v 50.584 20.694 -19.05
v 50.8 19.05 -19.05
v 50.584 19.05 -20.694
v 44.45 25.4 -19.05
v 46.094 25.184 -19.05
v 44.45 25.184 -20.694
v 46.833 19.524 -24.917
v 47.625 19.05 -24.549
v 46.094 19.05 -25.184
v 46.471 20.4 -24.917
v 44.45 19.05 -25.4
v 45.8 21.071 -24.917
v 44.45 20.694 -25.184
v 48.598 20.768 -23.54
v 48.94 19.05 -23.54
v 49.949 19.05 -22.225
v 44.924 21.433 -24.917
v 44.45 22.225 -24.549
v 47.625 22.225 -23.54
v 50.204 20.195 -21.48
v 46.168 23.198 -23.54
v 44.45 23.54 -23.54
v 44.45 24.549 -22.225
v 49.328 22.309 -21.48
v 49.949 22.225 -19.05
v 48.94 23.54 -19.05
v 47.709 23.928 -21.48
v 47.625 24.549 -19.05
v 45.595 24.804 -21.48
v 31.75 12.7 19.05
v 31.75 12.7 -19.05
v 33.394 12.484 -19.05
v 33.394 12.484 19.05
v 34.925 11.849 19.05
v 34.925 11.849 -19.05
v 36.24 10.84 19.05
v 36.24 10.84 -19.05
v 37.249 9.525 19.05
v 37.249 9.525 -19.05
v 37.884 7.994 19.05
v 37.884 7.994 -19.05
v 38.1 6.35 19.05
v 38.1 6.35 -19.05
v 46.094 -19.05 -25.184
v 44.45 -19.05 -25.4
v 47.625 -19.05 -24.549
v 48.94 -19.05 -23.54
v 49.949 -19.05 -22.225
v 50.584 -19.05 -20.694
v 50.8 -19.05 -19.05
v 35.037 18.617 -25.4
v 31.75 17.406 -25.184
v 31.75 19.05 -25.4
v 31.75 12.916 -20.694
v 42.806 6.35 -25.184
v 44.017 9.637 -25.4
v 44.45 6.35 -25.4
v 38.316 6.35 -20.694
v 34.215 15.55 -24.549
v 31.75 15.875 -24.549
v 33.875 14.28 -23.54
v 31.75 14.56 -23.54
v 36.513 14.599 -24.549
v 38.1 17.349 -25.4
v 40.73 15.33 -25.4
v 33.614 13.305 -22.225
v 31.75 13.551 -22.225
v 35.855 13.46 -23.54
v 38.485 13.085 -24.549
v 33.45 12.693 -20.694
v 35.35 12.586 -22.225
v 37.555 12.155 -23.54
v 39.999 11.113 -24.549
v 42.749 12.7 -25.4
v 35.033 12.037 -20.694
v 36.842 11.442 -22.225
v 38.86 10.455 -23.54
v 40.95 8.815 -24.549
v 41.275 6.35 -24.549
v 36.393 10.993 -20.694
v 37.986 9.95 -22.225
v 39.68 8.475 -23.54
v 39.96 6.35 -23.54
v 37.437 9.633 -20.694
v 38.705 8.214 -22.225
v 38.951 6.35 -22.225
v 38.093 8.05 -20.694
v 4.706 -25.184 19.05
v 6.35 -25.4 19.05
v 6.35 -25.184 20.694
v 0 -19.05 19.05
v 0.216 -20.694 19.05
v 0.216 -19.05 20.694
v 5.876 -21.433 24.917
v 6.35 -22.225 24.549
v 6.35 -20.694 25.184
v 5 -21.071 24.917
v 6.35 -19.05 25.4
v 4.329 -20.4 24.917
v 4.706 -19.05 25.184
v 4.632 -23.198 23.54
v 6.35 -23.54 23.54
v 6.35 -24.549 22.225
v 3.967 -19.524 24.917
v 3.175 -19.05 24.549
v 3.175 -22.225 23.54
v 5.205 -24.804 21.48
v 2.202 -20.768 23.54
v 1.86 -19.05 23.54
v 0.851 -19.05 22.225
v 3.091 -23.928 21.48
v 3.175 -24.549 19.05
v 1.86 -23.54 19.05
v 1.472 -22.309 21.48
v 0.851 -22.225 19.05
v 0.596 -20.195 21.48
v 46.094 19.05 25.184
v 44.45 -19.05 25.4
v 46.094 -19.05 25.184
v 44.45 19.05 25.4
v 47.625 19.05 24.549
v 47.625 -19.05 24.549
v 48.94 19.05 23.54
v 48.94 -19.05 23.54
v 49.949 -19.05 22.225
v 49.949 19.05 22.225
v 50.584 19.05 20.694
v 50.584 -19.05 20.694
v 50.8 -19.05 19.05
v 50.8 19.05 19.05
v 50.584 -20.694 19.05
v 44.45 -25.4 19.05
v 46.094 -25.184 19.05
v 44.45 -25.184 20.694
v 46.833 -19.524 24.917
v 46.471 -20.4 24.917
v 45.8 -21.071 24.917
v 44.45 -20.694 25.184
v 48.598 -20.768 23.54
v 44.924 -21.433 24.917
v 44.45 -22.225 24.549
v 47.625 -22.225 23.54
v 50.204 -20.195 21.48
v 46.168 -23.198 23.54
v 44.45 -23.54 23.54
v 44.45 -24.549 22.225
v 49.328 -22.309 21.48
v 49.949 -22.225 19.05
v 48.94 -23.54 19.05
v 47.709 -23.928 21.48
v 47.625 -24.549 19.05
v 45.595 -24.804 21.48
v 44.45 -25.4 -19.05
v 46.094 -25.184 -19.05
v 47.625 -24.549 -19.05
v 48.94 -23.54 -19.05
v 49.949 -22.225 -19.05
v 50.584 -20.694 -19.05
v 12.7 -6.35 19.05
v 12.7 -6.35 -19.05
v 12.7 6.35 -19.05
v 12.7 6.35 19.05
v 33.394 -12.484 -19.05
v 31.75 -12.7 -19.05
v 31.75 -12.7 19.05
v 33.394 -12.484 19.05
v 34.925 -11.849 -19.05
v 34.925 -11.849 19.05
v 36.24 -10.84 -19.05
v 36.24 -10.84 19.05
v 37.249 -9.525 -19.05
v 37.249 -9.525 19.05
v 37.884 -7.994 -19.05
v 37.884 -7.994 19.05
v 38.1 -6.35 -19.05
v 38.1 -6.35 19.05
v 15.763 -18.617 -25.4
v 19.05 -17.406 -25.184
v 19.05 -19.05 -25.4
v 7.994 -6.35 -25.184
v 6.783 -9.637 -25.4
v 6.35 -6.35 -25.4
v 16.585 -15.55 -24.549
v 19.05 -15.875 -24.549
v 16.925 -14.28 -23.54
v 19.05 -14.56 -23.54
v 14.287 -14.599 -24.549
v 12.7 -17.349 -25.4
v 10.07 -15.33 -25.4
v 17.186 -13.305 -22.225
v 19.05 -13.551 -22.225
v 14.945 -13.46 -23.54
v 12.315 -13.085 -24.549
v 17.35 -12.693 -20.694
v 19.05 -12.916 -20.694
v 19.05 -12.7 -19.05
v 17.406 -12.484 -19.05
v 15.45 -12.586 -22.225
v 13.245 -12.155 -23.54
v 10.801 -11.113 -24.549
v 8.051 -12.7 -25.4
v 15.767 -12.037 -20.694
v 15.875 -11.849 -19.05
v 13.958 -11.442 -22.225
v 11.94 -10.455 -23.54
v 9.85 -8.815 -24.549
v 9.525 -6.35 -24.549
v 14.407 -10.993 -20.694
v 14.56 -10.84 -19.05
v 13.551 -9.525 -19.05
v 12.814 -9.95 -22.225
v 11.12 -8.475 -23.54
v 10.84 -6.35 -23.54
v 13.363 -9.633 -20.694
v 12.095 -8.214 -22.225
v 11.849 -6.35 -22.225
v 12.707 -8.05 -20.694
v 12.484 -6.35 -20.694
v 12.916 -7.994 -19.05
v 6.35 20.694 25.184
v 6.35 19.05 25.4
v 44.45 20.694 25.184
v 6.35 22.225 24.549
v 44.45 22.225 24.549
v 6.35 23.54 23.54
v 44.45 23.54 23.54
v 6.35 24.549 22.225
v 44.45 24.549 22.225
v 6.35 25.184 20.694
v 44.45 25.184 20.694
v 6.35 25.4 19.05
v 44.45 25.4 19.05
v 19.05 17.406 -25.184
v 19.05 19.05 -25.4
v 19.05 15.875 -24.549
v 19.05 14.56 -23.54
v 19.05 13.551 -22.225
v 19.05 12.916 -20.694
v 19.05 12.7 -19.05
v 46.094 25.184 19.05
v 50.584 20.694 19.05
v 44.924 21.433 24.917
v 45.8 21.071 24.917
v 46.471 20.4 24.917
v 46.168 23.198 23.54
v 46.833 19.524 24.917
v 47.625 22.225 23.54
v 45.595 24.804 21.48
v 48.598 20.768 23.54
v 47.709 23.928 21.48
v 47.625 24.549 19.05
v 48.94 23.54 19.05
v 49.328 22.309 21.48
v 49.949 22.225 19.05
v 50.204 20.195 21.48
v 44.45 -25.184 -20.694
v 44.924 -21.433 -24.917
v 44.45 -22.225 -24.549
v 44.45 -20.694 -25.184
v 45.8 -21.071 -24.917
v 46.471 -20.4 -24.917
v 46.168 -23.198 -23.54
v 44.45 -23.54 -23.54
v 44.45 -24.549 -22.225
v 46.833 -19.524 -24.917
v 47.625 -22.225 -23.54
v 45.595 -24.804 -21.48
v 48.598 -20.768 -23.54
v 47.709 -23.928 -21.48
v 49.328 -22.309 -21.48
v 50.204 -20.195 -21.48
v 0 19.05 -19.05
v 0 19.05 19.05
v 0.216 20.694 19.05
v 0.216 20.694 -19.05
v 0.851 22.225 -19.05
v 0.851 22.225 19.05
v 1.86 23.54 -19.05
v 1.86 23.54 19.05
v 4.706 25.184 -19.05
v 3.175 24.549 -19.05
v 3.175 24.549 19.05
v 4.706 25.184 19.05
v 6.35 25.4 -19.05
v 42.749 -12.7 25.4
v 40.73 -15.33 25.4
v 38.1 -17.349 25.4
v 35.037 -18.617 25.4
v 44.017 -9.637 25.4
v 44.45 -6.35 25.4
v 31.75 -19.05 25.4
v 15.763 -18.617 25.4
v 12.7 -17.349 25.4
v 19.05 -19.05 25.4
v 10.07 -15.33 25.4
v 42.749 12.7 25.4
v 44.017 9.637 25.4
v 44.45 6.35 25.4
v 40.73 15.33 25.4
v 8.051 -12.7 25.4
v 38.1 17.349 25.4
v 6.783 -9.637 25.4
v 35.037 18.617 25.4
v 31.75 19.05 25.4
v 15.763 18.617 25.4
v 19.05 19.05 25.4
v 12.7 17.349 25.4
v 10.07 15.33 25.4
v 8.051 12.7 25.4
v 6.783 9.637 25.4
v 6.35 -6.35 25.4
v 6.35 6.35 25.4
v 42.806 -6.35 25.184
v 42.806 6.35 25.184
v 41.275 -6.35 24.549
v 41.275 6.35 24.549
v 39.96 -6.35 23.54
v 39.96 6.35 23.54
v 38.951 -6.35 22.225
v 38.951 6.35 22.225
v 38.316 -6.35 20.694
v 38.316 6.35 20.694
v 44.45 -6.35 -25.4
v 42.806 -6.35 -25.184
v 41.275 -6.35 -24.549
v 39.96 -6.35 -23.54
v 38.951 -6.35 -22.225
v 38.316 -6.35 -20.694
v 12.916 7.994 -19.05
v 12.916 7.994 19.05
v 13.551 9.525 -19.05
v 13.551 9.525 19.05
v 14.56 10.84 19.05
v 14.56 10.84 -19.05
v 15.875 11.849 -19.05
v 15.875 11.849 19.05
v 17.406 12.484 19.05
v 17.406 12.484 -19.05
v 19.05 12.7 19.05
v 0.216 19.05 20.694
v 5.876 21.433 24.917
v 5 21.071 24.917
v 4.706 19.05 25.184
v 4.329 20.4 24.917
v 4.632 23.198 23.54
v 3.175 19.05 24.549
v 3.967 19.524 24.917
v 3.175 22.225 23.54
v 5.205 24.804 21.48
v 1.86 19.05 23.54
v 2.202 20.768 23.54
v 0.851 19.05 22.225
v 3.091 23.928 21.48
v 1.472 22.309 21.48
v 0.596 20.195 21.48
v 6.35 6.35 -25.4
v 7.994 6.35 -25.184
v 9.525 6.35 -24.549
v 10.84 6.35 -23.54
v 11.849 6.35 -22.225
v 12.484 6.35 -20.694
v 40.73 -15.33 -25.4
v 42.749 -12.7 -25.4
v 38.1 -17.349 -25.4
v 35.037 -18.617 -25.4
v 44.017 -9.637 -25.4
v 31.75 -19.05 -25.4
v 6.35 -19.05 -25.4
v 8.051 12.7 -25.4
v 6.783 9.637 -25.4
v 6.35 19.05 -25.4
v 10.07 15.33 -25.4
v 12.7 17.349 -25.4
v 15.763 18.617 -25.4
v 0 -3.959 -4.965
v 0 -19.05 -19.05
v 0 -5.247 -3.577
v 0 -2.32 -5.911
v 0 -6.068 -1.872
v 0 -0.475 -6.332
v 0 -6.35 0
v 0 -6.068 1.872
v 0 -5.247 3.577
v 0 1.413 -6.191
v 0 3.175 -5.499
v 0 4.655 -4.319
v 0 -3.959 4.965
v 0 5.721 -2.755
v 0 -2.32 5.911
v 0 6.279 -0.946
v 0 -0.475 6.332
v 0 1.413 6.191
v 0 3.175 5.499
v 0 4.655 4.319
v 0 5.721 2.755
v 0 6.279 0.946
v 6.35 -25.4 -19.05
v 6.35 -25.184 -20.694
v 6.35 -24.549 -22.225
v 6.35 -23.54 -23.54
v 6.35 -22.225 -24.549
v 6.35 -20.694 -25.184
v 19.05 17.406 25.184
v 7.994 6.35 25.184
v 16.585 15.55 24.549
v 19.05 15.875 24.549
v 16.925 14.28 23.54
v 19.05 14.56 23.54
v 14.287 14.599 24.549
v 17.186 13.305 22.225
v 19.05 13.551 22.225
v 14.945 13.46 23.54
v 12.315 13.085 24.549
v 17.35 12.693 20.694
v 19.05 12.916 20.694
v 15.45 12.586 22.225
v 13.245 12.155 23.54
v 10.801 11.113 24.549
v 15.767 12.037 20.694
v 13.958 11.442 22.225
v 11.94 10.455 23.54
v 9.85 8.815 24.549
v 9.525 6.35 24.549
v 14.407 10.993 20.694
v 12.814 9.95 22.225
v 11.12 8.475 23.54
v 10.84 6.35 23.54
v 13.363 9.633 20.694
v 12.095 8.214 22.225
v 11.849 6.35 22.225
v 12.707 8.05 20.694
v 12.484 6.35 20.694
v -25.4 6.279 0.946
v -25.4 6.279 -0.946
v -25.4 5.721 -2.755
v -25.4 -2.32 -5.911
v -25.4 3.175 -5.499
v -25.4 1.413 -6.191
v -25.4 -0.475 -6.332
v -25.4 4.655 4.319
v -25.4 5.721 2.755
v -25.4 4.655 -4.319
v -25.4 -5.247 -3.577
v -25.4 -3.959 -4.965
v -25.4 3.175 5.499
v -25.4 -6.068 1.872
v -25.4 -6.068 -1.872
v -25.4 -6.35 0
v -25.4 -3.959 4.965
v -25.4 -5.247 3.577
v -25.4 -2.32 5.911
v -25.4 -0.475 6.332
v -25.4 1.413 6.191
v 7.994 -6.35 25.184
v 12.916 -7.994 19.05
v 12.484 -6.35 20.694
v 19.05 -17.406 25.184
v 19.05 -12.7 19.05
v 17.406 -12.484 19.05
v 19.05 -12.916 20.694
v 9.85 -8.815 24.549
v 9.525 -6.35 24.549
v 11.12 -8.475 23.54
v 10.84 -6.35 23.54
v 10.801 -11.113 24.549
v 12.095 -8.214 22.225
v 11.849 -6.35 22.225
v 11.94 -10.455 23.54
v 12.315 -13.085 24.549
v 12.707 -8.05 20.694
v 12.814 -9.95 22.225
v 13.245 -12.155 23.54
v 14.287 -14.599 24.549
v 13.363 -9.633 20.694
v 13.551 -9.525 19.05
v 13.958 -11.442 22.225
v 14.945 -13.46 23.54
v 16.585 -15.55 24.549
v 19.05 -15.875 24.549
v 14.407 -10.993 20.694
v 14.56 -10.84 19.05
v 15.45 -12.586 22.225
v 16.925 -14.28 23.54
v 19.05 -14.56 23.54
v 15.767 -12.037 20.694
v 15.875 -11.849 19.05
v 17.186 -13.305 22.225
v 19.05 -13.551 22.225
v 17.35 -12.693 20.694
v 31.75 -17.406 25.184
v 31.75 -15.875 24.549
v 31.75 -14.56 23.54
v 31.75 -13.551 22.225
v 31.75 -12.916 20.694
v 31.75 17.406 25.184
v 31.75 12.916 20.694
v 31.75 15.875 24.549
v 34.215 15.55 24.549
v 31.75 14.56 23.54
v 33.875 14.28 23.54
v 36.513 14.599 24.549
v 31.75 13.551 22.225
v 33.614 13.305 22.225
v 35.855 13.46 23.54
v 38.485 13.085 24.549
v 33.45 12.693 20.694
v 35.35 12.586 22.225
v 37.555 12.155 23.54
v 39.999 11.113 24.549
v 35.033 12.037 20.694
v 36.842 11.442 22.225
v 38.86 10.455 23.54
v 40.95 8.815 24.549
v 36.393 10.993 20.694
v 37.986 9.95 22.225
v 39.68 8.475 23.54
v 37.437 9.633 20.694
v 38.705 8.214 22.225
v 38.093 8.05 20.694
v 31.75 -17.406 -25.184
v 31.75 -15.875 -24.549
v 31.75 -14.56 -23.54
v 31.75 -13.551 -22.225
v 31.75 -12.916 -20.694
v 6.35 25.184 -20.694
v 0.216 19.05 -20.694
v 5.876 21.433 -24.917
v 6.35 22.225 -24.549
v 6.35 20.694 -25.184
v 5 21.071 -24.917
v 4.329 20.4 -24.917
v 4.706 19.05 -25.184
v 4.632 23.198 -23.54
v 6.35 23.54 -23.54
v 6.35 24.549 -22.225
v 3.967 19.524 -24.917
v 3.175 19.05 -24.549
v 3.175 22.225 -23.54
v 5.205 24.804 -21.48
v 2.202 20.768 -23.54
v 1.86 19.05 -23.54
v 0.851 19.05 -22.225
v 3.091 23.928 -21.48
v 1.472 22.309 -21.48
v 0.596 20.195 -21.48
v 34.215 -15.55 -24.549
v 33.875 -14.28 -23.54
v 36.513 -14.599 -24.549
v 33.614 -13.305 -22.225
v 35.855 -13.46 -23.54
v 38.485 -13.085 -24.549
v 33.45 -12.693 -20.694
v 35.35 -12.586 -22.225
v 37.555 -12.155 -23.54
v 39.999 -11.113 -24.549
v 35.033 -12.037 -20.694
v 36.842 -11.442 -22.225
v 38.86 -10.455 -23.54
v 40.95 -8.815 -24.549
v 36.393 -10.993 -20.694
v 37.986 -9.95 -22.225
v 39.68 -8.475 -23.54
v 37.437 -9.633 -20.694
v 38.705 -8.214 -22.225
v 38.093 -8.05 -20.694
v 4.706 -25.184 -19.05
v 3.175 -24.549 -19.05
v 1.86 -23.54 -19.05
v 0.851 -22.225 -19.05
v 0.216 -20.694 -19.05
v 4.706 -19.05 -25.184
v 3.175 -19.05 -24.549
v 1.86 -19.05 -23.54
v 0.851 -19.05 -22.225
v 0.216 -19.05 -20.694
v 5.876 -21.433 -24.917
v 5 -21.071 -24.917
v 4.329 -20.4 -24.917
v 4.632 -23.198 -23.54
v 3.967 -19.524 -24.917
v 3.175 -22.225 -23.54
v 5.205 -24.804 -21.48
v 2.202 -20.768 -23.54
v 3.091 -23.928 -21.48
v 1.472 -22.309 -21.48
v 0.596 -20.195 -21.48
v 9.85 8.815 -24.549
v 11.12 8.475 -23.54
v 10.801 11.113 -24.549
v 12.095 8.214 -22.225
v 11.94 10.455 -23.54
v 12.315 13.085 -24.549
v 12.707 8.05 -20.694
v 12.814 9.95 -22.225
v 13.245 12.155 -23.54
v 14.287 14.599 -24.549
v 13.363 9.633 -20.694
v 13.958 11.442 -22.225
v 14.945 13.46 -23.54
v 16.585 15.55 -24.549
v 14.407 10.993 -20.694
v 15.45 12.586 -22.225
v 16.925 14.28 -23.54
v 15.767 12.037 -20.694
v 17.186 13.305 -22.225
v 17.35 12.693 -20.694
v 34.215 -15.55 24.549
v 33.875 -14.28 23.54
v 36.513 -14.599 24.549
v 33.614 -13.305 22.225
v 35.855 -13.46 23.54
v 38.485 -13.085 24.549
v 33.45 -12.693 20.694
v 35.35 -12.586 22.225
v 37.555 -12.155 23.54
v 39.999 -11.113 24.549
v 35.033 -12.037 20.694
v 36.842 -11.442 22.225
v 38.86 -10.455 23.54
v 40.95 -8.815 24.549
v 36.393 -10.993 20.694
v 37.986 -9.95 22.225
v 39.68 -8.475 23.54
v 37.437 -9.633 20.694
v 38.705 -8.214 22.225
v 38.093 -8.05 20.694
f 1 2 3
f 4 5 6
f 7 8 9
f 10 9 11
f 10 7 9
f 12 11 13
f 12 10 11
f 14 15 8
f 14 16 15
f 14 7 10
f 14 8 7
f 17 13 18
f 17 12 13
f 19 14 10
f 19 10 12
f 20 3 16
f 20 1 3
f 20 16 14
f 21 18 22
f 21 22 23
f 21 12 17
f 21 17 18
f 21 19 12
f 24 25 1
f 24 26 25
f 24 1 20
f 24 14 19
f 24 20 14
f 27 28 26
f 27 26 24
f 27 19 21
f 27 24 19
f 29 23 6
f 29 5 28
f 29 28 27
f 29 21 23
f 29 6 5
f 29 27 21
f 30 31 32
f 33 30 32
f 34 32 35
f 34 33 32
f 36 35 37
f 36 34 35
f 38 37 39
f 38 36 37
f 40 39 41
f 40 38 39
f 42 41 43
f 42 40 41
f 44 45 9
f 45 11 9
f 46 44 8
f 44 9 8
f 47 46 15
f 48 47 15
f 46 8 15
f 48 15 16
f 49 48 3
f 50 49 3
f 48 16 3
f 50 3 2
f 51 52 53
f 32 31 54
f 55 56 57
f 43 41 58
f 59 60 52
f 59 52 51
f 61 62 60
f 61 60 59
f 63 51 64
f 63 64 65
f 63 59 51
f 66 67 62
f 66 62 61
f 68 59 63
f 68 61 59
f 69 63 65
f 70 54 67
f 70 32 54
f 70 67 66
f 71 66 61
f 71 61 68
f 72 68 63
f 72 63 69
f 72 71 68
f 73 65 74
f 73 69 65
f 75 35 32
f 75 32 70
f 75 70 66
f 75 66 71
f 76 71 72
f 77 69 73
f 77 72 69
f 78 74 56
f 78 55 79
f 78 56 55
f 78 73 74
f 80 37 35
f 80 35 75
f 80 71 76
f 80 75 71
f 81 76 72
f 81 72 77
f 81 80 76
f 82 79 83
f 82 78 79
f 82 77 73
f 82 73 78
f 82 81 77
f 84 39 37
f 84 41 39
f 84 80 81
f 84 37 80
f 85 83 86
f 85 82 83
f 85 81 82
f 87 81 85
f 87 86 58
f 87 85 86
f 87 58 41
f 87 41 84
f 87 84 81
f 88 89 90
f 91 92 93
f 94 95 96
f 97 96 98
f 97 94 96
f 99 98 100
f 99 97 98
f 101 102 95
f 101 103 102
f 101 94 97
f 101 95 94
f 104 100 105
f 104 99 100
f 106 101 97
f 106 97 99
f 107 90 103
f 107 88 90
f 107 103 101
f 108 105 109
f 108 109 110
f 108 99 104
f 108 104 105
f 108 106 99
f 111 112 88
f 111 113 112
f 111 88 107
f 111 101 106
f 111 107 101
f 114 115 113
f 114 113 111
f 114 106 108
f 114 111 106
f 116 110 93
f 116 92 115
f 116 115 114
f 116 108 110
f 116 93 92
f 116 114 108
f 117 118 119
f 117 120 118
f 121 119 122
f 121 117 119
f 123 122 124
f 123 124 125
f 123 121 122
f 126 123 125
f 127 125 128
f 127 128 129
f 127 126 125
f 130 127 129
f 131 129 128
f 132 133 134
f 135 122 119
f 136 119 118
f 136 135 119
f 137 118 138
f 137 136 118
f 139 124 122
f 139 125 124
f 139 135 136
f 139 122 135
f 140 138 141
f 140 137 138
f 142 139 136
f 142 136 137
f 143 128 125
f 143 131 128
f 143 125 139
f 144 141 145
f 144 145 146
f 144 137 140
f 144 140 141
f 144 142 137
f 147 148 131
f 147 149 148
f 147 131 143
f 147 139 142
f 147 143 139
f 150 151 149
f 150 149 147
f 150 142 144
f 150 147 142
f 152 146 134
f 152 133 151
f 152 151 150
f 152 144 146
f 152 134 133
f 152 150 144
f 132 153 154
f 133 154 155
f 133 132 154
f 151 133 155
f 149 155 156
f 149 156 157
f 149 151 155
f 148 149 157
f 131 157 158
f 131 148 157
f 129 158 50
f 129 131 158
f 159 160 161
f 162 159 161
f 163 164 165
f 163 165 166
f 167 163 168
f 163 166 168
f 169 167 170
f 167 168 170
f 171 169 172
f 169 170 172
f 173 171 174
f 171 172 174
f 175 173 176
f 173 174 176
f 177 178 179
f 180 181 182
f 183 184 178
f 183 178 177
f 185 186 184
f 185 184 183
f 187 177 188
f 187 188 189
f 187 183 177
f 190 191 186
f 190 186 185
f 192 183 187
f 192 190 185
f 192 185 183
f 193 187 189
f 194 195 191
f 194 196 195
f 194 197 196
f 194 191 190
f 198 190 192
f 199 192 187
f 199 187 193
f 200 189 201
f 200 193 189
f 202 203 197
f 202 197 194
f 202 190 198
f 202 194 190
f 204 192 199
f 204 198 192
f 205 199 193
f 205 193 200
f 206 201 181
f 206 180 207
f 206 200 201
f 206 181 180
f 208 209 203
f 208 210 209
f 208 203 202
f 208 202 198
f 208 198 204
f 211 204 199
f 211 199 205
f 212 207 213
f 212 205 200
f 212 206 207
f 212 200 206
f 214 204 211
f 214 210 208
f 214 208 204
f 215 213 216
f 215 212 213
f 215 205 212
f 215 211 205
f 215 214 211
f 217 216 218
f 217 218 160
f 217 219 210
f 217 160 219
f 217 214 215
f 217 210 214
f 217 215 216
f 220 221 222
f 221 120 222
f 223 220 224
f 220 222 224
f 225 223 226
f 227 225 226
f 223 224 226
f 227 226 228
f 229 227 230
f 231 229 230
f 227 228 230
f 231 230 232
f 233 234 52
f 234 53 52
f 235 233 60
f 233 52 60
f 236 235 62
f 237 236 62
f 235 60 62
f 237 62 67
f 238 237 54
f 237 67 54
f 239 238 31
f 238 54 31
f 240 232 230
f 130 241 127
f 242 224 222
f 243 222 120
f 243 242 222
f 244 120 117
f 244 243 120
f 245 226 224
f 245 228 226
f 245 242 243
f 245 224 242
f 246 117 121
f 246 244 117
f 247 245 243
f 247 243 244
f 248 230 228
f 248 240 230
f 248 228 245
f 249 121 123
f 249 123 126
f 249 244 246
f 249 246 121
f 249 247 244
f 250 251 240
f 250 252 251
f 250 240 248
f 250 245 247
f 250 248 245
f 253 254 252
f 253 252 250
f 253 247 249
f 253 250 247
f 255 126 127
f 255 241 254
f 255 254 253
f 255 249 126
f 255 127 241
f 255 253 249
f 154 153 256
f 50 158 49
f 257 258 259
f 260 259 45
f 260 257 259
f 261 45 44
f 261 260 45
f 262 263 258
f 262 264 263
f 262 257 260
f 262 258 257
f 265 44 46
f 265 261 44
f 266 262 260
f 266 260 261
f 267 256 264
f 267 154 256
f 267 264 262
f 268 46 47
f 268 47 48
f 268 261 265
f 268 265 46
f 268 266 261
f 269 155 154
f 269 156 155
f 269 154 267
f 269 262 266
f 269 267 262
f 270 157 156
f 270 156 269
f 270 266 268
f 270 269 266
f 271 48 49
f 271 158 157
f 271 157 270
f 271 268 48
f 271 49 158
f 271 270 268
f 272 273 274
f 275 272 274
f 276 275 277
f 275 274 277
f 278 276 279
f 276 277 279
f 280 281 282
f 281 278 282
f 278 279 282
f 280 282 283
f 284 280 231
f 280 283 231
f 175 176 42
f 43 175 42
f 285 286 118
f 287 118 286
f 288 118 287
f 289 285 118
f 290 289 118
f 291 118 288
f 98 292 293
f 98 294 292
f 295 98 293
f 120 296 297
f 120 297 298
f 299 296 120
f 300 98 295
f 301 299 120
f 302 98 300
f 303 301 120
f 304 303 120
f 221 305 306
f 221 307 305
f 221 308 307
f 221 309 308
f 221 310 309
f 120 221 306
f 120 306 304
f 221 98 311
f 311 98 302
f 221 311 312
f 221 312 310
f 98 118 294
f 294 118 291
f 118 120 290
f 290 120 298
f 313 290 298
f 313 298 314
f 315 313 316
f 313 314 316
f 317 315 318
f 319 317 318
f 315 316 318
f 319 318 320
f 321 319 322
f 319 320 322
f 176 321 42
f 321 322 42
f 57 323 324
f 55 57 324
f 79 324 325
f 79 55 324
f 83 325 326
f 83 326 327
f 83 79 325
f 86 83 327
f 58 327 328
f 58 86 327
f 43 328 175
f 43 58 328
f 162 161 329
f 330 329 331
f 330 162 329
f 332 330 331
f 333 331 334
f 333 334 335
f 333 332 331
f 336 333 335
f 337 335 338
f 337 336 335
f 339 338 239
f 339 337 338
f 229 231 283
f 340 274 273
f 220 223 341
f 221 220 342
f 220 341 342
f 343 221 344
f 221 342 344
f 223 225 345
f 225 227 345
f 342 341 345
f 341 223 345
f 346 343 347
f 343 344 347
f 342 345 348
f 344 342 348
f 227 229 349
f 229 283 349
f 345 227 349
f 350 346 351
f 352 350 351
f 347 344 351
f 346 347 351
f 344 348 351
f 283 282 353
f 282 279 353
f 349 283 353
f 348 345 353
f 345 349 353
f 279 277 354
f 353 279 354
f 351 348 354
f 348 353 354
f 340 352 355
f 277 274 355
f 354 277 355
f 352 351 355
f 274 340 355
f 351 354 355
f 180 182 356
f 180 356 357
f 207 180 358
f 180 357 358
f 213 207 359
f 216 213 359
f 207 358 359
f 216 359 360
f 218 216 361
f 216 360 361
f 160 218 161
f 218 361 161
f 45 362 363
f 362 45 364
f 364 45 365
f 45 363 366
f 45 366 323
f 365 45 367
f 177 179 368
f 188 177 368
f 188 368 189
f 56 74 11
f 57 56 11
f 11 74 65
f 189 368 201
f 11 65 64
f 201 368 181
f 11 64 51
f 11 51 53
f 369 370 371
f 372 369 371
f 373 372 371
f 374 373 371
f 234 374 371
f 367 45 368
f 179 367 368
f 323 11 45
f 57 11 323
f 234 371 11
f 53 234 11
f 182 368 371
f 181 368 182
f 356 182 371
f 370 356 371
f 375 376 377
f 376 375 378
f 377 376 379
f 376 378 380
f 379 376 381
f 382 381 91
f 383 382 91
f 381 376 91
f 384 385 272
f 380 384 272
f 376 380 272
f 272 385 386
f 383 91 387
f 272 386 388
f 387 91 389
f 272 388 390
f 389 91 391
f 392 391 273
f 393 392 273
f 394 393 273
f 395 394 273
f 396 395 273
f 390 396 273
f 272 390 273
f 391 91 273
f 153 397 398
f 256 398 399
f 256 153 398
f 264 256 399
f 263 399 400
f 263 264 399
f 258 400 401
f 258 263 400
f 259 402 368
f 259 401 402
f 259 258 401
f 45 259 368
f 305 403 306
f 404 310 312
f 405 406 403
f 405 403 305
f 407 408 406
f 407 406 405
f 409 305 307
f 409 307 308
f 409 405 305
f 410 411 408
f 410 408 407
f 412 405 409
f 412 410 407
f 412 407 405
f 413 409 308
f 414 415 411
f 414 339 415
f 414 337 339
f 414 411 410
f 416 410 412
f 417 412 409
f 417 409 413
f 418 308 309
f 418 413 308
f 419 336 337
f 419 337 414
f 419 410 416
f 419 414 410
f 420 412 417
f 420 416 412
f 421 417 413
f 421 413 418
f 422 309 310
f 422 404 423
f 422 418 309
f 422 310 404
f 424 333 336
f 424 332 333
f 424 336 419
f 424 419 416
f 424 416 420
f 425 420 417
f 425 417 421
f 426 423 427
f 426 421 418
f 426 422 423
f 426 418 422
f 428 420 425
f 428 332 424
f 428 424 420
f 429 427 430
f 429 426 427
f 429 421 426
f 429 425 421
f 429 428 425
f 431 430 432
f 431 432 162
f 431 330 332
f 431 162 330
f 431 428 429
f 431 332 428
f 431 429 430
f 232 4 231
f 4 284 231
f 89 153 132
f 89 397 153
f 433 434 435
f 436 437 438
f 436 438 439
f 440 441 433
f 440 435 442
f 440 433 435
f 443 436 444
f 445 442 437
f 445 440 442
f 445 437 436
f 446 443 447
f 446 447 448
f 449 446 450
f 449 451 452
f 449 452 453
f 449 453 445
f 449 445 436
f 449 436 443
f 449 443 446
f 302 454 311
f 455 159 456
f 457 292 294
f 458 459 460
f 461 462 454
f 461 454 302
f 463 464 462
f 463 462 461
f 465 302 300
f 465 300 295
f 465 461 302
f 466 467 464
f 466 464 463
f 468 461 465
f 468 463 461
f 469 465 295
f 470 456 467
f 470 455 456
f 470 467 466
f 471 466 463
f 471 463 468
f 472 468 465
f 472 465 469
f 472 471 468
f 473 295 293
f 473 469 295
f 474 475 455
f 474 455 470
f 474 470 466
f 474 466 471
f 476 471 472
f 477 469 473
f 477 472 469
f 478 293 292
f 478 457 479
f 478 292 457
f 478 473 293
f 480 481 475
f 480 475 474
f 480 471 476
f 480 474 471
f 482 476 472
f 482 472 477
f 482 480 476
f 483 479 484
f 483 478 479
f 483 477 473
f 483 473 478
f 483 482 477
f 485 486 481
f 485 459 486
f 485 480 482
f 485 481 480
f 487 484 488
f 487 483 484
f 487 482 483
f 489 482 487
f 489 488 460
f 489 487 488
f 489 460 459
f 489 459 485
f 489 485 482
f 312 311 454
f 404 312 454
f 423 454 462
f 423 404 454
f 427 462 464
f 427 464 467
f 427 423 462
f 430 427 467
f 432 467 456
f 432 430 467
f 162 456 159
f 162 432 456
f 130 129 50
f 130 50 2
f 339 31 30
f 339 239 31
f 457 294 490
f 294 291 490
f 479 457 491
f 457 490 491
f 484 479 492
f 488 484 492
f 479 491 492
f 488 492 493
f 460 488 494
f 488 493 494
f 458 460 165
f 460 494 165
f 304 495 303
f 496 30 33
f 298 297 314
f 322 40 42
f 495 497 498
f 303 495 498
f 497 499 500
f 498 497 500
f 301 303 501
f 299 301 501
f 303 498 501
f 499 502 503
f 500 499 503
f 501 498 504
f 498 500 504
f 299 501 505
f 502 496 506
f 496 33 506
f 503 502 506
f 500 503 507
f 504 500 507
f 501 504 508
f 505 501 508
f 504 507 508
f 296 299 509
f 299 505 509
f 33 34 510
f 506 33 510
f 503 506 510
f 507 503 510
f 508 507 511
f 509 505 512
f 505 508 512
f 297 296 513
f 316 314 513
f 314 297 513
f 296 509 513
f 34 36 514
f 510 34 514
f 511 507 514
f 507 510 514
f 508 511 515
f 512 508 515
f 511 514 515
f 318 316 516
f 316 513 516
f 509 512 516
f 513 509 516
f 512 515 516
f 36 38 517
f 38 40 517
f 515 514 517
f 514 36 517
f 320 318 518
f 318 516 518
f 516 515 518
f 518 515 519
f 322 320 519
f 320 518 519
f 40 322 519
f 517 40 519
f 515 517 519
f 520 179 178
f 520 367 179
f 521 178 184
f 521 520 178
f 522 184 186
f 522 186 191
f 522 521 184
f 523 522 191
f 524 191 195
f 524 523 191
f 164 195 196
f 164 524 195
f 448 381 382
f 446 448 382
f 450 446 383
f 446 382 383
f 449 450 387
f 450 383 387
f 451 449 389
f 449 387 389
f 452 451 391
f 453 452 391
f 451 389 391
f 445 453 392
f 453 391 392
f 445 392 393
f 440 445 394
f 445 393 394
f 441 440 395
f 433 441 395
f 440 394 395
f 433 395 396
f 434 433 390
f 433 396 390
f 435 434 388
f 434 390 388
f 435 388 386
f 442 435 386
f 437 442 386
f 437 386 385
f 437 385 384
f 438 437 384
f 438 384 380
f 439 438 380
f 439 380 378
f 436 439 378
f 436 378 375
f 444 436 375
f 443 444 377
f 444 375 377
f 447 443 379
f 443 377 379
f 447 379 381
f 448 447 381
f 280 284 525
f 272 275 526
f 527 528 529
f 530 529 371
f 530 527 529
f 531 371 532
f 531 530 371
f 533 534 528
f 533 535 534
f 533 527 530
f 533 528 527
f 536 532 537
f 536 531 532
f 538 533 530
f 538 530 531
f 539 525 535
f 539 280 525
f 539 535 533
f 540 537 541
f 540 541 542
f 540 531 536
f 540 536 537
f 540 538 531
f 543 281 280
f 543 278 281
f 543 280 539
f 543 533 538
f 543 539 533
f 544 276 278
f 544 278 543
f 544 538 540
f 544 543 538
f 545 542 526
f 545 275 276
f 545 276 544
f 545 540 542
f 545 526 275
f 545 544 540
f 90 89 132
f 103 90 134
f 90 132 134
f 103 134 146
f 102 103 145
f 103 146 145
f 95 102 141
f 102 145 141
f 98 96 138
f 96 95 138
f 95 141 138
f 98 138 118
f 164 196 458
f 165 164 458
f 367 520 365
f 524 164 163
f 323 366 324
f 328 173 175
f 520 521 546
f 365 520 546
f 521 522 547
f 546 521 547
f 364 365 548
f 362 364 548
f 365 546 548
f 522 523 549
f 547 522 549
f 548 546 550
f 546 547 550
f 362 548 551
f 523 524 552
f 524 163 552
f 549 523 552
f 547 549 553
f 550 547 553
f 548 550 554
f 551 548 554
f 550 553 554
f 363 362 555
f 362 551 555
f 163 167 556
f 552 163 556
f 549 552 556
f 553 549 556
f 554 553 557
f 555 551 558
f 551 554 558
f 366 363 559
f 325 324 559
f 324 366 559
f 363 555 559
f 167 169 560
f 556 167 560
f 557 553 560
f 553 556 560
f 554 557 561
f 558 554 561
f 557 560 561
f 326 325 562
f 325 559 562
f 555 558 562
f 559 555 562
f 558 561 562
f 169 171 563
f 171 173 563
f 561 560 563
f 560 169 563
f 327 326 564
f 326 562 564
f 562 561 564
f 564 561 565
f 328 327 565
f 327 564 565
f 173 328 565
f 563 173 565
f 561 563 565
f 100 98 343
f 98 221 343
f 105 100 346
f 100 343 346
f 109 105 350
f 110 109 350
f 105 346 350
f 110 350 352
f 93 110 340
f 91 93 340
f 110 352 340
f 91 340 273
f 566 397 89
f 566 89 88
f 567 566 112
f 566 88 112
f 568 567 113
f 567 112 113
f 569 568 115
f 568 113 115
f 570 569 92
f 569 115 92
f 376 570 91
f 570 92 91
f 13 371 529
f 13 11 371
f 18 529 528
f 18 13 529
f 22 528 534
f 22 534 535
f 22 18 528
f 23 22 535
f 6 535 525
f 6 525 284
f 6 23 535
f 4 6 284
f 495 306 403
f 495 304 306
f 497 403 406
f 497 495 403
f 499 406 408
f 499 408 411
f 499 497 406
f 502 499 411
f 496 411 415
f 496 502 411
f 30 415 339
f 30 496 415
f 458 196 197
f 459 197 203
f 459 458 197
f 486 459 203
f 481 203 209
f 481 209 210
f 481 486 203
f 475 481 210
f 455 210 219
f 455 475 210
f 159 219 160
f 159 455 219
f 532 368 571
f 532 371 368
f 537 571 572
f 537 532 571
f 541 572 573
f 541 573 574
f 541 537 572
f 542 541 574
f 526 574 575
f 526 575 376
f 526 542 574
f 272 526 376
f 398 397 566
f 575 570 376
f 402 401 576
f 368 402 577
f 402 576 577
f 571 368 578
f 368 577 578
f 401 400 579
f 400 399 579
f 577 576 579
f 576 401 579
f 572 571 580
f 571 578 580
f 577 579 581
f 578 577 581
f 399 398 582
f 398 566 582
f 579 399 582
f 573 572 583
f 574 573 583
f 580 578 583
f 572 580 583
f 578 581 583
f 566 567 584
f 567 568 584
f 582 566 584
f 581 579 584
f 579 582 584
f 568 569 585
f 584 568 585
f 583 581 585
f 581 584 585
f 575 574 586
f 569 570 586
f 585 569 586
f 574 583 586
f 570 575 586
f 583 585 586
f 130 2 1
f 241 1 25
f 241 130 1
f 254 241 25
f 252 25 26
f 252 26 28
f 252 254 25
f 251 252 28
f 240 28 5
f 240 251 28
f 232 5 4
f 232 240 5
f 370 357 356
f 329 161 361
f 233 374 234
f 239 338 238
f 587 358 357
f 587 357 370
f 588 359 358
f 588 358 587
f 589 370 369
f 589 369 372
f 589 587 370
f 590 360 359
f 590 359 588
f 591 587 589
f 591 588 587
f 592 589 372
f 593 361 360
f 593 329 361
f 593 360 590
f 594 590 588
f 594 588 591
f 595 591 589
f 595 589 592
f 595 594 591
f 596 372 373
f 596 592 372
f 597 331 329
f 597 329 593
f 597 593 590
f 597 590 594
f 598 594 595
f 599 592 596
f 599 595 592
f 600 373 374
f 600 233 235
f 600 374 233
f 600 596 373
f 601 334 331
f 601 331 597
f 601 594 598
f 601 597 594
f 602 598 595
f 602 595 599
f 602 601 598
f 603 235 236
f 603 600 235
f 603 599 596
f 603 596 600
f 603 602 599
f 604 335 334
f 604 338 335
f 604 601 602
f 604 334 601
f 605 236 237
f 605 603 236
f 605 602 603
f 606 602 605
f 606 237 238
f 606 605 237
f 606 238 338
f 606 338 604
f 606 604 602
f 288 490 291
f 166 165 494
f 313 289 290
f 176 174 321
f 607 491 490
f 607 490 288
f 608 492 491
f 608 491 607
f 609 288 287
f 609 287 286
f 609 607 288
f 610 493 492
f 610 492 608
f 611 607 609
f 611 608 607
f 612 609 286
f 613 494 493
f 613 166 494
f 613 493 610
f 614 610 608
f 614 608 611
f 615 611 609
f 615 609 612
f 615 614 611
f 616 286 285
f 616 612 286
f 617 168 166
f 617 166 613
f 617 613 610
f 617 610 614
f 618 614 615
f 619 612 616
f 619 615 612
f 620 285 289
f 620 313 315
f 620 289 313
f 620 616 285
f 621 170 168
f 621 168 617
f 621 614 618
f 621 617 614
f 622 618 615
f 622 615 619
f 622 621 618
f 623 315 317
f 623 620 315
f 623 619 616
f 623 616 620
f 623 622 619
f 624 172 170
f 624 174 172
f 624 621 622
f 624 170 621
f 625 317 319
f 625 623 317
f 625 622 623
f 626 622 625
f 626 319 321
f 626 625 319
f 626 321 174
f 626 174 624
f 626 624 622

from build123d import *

# Parameters (mm, degrees)
F0_W     = 50.8
F0_H     = 50.8
F1_DEPTH = 50.8
F2_T     = -12.7
F3_R     = 6.35
F4_DEPTH = 25.4
F5_R     = 6.34999


# Not quite as in the source:
# - a fillet or chamfer is up to 0.001 mm smaller than in the source, because OpenCascade refuses the exact size


with BuildPart() as f1:
    # F0 (on Right) → F1 (new body)
    with BuildSketch(Plane.YZ):
        Rectangle(F0_W, F0_H)
    extrude(amount=F1_DEPTH)

    # F2
    f2_openings = [f1.faces().sort_by_distance(p)[0] for p in [
        (25.4, 0, 25.4),
        (25.4, 0, -25.4),
    ]]
    offset(amount=F2_T, openings=f2_openings)

    # F3 (on face) → F4 (join)
    with BuildSketch(Plane(origin=(0, 0, 0), x_dir=(0, -1, 0), z_dir=(-1, 0, 0))):
        Circle(F3_R)
    extrude(amount=F4_DEPTH)

    # F5 (radius 6.35 in the source; OpenCascade refuses exactly that, so slightly less here)
    f5_edges = [f1.edges().sort_by_distance(p)[0] for p in [
        (50.8, -25.4, 0),
        (0, -25.4, 0),
        (50.8, 25.4, 0),
        (0, 25.4, 0),
        (12.7, -12.7, 0),
        (38.1, 12.7, 0),
        (12.7, 12.7, 0),
        (38.1, -12.7, 0),
        (25.4, 25.4, 25.4),
        (50.8, 0, 25.4),
        (25.4, -25.4, 25.4),
        (0, 0, 25.4),
        (25.4, 12.7, 25.4),
        (12.7, 0, 25.4),
        (25.4, -12.7, 25.4),
        (38.1, 0, 25.4),
        (25.4, -25.4, -25.4),
        (50.8, 0, -25.4),
        (25.4, 25.4, -25.4),
        (0, 0, -25.4),
        (25.4, -12.7, -25.4),
        (12.7, 0, -25.4),
        (25.4, 12.7, -25.4),
        (38.1, 0, -25.4),
    ]]
    fillet(f5_edges, radius=F5_R)


solid = f1.part
